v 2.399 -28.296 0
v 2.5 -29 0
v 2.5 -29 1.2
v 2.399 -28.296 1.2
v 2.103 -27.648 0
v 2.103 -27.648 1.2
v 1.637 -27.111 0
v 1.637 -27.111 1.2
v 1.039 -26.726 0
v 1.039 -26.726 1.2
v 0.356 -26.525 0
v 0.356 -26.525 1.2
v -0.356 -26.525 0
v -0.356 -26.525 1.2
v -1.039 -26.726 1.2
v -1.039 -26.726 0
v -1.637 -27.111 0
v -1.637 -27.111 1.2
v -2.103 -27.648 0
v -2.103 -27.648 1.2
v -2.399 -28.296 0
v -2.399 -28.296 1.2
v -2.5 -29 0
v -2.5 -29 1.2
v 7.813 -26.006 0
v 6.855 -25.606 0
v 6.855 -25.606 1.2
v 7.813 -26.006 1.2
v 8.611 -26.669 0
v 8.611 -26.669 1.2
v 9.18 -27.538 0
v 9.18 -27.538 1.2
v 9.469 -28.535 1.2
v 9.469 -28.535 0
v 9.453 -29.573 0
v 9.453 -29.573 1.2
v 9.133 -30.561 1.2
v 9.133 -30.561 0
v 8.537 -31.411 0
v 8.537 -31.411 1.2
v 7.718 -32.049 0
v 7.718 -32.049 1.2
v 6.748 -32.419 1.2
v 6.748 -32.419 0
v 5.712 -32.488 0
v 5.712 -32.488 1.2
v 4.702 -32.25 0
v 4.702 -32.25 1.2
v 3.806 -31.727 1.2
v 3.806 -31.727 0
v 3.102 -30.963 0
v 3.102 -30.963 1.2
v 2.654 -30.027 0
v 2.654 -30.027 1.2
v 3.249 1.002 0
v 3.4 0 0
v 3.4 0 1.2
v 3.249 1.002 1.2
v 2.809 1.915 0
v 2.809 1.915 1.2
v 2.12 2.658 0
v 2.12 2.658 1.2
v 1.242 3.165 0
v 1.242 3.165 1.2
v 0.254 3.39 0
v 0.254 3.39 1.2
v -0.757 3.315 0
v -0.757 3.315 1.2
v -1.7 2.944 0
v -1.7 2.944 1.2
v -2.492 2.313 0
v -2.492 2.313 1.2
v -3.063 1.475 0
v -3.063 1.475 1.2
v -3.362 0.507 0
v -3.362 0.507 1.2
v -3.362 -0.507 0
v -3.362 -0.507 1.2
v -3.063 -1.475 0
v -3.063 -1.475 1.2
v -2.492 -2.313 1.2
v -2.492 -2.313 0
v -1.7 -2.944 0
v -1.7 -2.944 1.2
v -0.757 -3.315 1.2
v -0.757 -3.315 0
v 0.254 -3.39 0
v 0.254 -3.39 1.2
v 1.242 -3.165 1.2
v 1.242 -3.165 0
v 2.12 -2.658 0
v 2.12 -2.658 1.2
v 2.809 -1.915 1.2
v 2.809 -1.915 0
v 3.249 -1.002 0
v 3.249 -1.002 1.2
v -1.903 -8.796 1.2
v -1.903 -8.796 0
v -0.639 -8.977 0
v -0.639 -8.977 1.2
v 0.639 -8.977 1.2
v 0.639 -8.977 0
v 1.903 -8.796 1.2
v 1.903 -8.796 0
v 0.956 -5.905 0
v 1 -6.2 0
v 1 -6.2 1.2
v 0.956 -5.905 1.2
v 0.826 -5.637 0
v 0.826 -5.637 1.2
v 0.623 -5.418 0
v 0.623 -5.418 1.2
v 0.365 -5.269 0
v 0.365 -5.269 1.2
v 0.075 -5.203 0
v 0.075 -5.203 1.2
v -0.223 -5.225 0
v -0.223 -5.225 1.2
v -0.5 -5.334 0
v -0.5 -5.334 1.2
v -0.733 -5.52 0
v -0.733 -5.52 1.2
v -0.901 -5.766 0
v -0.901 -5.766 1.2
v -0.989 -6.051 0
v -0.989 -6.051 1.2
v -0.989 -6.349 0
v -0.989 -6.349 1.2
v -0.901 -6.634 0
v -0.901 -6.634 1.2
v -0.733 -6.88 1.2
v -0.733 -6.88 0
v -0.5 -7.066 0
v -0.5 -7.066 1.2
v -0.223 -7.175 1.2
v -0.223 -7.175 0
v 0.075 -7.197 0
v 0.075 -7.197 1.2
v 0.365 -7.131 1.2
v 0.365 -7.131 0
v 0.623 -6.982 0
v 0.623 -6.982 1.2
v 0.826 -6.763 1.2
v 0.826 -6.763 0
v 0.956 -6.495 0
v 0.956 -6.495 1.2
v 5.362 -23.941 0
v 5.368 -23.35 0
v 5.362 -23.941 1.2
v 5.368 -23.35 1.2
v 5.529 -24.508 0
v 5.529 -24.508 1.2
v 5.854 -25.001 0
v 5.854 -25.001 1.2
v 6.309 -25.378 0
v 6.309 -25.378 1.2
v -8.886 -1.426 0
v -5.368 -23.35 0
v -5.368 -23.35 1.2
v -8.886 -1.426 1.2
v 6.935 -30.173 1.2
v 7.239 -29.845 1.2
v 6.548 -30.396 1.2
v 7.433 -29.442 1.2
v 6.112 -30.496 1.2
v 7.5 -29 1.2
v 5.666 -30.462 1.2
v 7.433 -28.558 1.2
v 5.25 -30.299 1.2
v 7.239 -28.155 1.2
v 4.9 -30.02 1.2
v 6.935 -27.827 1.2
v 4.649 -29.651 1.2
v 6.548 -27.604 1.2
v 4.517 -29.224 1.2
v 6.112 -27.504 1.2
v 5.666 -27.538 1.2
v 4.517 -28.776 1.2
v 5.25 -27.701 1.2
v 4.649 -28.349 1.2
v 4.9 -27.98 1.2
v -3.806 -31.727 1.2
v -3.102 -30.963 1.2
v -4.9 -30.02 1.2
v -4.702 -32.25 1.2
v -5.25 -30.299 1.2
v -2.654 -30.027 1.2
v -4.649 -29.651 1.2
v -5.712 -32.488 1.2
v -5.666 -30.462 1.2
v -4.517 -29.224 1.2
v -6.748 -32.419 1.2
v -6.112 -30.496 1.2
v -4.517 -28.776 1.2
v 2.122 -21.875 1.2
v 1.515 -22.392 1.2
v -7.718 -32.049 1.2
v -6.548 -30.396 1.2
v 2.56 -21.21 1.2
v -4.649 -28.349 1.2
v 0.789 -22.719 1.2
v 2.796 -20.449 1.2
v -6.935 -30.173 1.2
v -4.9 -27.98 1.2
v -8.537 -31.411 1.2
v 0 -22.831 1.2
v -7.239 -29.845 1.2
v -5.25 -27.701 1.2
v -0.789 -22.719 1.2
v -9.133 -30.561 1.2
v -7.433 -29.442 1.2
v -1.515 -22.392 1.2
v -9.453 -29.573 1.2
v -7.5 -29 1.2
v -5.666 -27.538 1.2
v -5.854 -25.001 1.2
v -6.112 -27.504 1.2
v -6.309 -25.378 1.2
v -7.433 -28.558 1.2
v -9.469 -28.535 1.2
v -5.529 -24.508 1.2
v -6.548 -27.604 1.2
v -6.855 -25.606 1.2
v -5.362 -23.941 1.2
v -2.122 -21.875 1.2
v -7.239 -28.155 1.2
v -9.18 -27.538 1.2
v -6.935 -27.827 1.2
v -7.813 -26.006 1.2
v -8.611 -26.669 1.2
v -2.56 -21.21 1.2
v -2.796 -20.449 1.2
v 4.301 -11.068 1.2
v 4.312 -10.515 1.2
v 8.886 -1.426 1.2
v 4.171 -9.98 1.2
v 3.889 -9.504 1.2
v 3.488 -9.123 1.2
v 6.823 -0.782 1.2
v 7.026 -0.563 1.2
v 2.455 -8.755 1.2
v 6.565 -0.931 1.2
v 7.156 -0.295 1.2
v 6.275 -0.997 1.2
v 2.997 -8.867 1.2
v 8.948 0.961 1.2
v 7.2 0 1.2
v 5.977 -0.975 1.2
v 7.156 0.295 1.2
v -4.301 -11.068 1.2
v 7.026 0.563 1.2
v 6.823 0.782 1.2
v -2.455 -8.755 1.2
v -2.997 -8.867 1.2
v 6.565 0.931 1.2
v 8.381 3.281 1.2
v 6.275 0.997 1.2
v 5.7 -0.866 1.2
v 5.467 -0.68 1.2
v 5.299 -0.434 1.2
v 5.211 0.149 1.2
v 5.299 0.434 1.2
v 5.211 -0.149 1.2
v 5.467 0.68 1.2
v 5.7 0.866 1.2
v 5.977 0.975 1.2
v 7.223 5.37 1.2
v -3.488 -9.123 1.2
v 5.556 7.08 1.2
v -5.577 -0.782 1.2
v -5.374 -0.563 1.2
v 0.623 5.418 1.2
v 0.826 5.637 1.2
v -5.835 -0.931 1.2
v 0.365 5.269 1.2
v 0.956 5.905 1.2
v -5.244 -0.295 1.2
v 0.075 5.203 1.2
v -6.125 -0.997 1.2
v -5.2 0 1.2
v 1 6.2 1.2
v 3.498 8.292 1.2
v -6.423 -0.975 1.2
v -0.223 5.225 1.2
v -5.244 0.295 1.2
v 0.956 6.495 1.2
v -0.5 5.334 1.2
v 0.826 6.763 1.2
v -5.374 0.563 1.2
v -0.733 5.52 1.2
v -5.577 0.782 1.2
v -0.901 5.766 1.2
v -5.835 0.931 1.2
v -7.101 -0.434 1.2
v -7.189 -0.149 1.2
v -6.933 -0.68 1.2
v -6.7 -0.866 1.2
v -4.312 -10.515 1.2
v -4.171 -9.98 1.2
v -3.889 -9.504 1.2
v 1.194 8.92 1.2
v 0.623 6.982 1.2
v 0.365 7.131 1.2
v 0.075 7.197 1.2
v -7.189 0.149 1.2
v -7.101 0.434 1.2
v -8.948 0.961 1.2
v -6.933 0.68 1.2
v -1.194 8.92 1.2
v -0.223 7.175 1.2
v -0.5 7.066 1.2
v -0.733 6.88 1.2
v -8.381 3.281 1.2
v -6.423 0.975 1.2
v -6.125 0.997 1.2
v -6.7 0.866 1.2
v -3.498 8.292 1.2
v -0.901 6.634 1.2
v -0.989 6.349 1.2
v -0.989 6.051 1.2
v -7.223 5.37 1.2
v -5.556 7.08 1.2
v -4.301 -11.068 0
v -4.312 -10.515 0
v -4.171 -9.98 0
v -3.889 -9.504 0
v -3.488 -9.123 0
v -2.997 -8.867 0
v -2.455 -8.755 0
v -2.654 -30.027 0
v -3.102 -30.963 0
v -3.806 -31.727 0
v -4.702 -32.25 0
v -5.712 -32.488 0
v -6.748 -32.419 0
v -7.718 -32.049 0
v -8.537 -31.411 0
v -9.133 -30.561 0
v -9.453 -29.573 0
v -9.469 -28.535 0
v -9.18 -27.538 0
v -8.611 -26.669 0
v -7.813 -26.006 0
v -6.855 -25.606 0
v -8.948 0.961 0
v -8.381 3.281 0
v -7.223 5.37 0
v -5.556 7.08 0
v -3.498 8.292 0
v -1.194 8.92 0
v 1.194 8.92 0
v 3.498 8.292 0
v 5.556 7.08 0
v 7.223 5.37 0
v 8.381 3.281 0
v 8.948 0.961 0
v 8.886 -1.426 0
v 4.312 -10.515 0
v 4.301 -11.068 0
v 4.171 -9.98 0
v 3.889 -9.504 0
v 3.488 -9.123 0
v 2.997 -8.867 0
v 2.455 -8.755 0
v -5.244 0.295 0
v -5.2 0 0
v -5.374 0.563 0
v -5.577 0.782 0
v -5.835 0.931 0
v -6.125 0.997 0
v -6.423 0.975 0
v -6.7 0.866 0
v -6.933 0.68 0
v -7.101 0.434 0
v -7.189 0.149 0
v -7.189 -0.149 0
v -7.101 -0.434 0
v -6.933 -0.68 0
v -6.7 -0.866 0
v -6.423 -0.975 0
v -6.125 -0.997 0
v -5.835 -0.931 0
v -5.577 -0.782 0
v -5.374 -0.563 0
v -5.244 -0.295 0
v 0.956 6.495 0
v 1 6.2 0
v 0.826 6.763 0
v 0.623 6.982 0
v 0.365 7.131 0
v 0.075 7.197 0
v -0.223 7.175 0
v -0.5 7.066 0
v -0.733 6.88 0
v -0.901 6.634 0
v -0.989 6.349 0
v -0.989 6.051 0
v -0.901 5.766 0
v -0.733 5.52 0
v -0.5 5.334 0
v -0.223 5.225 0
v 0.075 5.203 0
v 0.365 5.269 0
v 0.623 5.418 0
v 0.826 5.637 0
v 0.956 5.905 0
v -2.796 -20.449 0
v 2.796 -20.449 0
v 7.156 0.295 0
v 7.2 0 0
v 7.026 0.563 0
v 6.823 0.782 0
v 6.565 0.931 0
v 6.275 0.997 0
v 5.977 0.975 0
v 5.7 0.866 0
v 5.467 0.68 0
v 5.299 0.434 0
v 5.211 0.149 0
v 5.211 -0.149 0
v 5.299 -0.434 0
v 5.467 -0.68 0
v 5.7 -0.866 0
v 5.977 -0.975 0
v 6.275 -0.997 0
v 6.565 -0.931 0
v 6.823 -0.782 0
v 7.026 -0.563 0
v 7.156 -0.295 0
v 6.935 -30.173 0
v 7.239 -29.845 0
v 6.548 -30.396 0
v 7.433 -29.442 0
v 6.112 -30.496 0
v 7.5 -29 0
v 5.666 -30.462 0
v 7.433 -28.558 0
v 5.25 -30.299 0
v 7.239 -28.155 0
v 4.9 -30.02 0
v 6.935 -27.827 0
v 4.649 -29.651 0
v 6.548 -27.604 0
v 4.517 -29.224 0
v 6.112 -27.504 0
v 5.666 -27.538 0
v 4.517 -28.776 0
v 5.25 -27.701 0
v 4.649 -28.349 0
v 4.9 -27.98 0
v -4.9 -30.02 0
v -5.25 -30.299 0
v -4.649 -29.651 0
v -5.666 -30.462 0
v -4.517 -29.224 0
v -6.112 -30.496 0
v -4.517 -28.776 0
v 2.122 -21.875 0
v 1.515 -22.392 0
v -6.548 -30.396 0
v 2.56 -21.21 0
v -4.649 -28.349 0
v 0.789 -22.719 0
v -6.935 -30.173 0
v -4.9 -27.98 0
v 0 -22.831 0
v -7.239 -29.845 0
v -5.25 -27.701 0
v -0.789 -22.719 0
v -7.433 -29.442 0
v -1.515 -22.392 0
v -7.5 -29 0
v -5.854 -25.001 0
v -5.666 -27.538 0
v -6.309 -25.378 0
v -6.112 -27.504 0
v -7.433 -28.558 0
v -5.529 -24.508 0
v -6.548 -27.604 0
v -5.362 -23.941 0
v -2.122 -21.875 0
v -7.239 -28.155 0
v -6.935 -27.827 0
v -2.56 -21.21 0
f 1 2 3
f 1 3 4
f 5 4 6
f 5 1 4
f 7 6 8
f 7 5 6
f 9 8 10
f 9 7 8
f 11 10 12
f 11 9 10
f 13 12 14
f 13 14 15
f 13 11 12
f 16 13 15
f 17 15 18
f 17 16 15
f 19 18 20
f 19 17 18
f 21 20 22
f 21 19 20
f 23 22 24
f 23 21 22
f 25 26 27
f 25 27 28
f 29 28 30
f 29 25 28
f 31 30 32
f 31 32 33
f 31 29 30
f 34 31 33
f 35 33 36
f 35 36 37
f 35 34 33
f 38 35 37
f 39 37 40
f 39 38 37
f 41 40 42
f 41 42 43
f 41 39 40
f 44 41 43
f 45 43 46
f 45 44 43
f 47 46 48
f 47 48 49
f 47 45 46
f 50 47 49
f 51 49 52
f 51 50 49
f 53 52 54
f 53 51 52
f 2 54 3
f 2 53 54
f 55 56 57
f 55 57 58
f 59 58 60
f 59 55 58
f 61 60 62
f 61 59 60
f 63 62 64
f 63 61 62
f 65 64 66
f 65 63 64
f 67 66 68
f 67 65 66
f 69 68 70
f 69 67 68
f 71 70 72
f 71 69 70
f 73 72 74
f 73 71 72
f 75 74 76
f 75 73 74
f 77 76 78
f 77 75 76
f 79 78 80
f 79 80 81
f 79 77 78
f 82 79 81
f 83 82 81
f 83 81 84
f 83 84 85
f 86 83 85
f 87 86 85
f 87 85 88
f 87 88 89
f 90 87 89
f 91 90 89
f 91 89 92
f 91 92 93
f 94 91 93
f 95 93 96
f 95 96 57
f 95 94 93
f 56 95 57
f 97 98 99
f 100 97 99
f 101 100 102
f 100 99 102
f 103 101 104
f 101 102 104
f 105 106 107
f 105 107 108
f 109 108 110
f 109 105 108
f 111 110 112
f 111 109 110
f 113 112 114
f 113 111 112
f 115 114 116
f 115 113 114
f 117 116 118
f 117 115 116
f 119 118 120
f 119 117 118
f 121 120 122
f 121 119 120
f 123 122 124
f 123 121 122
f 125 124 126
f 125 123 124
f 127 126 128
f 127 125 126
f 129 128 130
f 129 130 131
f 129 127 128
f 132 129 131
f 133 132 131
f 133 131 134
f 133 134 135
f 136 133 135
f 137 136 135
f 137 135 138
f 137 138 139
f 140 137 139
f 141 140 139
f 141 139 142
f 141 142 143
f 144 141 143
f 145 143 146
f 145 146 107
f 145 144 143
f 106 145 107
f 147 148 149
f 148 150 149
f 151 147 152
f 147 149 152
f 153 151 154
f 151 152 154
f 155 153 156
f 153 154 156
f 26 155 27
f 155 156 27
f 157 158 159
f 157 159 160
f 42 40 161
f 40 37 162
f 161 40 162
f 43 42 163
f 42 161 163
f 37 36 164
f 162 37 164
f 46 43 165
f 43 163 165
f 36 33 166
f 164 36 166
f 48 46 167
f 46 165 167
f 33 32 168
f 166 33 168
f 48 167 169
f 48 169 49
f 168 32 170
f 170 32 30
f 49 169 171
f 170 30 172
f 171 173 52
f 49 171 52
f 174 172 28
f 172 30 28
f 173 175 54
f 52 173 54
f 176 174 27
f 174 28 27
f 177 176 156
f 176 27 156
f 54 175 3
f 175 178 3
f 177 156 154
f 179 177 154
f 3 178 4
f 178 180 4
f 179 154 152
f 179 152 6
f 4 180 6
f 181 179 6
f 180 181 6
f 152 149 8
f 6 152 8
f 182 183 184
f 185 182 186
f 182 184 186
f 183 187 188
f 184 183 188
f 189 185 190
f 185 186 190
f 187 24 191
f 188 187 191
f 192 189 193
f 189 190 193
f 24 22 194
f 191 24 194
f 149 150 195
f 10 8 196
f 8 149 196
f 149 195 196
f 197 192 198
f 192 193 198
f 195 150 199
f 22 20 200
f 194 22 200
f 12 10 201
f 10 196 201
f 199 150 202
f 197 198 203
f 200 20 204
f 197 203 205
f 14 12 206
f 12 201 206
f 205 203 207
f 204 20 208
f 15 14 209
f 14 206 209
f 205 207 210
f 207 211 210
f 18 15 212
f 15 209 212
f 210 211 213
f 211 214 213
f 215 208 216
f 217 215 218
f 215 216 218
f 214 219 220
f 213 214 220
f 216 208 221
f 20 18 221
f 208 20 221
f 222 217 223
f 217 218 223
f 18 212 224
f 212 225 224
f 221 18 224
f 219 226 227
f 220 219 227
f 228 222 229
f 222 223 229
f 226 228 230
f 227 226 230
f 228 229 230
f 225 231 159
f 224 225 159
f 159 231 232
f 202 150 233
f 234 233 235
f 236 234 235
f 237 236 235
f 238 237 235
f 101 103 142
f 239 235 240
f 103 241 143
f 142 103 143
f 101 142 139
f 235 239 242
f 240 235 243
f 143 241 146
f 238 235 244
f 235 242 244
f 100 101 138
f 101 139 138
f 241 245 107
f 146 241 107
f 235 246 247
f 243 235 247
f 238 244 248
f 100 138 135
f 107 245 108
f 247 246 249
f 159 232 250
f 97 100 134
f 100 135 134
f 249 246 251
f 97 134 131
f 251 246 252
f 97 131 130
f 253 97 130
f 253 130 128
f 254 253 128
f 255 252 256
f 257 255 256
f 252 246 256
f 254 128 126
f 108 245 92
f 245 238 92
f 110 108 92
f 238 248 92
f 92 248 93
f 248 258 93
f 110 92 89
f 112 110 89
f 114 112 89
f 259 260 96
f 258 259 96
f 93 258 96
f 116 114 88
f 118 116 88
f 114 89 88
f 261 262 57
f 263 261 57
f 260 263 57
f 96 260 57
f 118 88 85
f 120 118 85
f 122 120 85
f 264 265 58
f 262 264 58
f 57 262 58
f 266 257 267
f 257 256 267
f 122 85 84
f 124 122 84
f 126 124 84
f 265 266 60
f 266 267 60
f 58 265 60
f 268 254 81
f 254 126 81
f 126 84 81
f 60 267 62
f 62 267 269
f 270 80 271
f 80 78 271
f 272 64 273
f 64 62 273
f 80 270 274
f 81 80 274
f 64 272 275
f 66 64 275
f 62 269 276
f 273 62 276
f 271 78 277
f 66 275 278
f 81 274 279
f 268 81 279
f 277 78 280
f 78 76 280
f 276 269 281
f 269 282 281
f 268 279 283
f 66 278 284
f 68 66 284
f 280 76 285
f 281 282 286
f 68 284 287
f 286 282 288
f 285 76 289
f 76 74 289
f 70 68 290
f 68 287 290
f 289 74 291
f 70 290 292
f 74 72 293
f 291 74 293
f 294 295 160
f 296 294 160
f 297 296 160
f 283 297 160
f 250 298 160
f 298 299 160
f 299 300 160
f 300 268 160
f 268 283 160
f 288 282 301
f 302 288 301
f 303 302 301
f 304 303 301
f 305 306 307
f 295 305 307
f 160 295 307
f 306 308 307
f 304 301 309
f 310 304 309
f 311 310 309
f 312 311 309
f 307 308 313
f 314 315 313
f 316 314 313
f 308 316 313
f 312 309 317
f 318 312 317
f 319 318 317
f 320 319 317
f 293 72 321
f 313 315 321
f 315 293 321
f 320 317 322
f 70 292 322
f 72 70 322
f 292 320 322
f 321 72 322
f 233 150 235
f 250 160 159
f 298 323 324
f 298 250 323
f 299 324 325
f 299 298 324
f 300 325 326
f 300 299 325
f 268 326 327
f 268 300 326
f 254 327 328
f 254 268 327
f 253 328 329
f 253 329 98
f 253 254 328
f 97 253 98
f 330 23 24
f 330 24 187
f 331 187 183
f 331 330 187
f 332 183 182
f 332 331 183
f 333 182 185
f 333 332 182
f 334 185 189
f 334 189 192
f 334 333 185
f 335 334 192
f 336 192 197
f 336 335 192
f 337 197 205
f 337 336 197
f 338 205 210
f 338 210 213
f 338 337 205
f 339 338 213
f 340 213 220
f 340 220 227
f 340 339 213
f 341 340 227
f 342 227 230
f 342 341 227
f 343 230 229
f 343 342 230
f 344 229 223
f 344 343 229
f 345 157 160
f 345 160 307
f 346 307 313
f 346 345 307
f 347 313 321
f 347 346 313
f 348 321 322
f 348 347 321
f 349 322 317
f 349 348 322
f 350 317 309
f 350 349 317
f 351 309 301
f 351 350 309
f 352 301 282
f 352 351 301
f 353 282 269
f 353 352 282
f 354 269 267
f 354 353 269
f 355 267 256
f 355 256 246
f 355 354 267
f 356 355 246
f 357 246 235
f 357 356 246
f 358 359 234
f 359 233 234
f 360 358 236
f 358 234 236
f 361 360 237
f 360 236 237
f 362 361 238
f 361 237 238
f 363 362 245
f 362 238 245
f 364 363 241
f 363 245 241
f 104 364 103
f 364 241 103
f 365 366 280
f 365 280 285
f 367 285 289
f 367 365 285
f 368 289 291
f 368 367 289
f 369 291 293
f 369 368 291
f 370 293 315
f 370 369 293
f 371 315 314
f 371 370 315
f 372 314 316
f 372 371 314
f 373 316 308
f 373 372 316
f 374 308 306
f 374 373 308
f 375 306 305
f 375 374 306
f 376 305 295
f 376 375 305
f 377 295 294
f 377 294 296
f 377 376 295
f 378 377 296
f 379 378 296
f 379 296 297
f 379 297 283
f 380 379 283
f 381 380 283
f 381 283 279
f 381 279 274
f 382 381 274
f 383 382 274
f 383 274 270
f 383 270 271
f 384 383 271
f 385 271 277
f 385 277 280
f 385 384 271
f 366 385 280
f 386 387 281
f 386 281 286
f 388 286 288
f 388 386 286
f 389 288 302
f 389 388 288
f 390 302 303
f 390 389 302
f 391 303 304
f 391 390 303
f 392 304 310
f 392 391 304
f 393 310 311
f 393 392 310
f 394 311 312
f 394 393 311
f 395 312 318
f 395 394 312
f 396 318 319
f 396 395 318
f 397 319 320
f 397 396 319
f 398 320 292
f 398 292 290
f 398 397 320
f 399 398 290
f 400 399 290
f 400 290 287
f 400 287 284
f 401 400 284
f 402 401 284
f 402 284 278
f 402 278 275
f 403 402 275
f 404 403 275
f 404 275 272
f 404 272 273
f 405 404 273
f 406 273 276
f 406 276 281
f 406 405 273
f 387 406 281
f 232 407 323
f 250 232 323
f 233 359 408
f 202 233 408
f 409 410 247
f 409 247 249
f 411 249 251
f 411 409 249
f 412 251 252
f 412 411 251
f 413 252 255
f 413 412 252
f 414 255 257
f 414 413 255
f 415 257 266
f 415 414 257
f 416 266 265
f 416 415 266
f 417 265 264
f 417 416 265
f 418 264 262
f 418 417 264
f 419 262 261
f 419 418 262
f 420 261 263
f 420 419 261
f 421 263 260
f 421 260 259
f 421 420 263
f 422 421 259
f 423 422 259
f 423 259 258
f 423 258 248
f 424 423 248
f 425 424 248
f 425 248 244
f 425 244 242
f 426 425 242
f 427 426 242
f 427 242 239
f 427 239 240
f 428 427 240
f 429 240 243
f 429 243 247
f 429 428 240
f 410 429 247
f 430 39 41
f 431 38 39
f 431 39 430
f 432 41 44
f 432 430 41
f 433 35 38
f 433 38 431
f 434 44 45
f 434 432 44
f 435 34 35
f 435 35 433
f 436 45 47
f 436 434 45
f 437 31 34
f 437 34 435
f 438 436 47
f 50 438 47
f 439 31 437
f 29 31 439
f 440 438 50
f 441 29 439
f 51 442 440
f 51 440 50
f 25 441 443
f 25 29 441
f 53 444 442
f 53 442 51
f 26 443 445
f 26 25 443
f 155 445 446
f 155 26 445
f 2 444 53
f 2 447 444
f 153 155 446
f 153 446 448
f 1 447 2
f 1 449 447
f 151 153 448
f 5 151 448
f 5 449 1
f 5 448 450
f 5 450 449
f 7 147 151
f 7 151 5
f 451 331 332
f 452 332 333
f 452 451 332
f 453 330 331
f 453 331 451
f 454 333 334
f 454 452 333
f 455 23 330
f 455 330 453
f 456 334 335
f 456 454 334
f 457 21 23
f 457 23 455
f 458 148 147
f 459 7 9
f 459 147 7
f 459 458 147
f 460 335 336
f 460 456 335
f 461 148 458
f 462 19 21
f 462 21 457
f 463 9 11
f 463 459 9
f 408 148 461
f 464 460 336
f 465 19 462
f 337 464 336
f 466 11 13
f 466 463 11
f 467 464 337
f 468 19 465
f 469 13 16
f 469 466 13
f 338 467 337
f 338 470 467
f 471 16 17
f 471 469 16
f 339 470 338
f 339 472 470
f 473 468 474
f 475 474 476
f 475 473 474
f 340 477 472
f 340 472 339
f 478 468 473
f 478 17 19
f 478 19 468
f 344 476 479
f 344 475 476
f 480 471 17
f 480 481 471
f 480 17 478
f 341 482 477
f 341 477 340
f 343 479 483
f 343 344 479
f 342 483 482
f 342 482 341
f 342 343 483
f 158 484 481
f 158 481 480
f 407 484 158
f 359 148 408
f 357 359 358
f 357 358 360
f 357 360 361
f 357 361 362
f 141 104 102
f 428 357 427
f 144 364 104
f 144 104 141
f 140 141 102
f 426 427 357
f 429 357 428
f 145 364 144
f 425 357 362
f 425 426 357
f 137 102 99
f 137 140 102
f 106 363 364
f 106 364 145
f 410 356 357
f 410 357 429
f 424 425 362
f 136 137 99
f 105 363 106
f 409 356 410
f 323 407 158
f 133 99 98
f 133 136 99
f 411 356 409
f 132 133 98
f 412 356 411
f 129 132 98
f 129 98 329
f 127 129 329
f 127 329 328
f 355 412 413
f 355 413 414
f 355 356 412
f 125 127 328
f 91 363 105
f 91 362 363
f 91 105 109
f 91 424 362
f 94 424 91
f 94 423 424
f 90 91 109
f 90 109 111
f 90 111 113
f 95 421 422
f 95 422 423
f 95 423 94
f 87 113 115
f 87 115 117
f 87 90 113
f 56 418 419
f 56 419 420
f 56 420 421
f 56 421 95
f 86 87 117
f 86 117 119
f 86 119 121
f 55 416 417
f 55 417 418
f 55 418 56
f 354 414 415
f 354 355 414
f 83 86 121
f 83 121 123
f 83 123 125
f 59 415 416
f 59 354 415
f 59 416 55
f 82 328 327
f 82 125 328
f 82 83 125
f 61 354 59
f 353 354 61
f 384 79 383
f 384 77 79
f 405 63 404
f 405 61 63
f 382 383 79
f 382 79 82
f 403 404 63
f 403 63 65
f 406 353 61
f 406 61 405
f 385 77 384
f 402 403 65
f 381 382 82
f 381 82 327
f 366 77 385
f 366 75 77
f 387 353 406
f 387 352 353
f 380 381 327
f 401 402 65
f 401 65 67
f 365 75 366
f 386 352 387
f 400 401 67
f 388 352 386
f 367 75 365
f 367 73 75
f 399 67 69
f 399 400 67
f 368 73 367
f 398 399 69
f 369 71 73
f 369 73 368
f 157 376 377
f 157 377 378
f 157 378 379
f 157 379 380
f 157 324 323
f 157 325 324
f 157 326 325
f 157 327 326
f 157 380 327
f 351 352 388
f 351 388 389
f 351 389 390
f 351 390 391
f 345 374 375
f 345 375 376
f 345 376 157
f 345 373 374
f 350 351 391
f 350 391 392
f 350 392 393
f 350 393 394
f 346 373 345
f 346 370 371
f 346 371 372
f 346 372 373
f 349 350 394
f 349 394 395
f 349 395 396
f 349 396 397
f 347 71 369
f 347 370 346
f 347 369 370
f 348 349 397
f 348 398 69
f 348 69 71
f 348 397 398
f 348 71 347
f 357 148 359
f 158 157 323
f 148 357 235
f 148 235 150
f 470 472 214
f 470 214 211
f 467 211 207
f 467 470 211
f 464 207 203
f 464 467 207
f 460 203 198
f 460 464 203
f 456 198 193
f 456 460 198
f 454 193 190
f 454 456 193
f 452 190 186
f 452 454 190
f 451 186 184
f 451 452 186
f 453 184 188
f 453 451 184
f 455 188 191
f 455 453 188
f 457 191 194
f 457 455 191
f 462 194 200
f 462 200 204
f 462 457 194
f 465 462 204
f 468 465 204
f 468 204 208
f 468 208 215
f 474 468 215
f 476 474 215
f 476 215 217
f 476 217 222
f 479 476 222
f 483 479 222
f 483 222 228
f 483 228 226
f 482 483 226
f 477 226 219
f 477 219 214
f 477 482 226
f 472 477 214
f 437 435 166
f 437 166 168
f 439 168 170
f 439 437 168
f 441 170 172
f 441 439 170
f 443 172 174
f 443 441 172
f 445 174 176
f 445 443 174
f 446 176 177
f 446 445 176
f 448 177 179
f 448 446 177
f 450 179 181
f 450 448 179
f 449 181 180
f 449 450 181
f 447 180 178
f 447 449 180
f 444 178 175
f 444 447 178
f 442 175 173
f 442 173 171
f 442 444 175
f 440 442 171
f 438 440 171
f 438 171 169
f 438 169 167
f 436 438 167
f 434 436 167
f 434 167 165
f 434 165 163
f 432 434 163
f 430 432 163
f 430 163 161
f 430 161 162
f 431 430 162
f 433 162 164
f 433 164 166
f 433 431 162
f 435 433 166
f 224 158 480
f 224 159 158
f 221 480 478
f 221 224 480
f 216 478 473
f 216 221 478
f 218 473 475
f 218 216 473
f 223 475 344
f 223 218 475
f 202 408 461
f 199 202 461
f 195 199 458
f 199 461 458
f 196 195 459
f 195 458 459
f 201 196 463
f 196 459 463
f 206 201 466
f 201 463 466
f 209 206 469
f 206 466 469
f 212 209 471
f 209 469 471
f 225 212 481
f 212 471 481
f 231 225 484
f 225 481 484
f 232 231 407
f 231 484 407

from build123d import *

# Parameters (mm, degrees)
SKETCH1_R           = 3.4
SKETCH1_R_2         = 1
SKETCH1_R_3         = 1.5
BOSS_EXTRUDE1_DEPTH = 1.2
FILLET1_R           = 2


with BuildPart() as part:
    # Sketch1 → Boss-Extrude1 (new body)
    with BuildSketch(Plane.XY):
        with BuildLine():
            Line((8.886327877, -1.425895111), (5, -25.645898034))
            ThreePointArc((5, -25.645898034), (8.80624304, -31.091650066), (2.5, -29))
            ThreePointArc((2.5, -29), (0, -26.5), (-2.5, -29))
            ThreePointArc((-2.5, -29), (-8.80624304, -31.091650066), (-5, -25.645898034))
            Line((-5, -25.645898034), (-8.886327877, -1.425895111))
            ThreePointArc((-8.886327877, -1.425895111), (0, 9), (8.886327877, -1.425895111))
        make_face()
        Circle(SKETCH1_R, mode=Mode.SUBTRACT)
        with Locations((0, 6.2)):
            Circle(SKETCH1_R_2, mode=Mode.SUBTRACT)
        with Locations((6.2, 0)):
            Circle(SKETCH1_R_2, mode=Mode.SUBTRACT)
        with Locations((0, -6.2)):
            Circle(SKETCH1_R_2, mode=Mode.SUBTRACT)
        with Locations((-6.2, 0)):
            Circle(SKETCH1_R_2, mode=Mode.SUBTRACT)
        with Locations((6, -29)):
            Circle(SKETCH1_R_3, mode=Mode.SUBTRACT)
        with Locations(Location((-6, -29, 0), (0, 0, 180))):
            Circle(SKETCH1_R_3, mode=Mode.SUBTRACT)
        with BuildLine():
            Line((4.861419119, -7.574074475), (2.795583653, -20.448577761))
            ThreePointArc((2.795583653, -20.448577761), (0, -22.831344198), (-2.795583653, -20.448577761))
            Line((-2.795583653, -20.448577761), (-4.861419119, -7.574074475))
            ThreePointArc((-4.861419119, -7.574074475), (0, -9), (4.861419119, -7.574074475))
        make_face(mode=Mode.SUBTRACT)
    extrude(amount=BOSS_EXTRUDE1_DEPTH)

    # Fillet1
    fillet1_edges = [part.edges().sort_by_distance(p)[0] for p in [
        (5, -25.645898034, 0.6),
        (-5, -25.645898034, 0.6),
        (4.861419119, -7.574074475, 0.6),
        (-4.861419119, -7.574074475, 0.6),
    ]]
    fillet(fillet1_edges, radius=FILLET1_R)


solid = part.part
